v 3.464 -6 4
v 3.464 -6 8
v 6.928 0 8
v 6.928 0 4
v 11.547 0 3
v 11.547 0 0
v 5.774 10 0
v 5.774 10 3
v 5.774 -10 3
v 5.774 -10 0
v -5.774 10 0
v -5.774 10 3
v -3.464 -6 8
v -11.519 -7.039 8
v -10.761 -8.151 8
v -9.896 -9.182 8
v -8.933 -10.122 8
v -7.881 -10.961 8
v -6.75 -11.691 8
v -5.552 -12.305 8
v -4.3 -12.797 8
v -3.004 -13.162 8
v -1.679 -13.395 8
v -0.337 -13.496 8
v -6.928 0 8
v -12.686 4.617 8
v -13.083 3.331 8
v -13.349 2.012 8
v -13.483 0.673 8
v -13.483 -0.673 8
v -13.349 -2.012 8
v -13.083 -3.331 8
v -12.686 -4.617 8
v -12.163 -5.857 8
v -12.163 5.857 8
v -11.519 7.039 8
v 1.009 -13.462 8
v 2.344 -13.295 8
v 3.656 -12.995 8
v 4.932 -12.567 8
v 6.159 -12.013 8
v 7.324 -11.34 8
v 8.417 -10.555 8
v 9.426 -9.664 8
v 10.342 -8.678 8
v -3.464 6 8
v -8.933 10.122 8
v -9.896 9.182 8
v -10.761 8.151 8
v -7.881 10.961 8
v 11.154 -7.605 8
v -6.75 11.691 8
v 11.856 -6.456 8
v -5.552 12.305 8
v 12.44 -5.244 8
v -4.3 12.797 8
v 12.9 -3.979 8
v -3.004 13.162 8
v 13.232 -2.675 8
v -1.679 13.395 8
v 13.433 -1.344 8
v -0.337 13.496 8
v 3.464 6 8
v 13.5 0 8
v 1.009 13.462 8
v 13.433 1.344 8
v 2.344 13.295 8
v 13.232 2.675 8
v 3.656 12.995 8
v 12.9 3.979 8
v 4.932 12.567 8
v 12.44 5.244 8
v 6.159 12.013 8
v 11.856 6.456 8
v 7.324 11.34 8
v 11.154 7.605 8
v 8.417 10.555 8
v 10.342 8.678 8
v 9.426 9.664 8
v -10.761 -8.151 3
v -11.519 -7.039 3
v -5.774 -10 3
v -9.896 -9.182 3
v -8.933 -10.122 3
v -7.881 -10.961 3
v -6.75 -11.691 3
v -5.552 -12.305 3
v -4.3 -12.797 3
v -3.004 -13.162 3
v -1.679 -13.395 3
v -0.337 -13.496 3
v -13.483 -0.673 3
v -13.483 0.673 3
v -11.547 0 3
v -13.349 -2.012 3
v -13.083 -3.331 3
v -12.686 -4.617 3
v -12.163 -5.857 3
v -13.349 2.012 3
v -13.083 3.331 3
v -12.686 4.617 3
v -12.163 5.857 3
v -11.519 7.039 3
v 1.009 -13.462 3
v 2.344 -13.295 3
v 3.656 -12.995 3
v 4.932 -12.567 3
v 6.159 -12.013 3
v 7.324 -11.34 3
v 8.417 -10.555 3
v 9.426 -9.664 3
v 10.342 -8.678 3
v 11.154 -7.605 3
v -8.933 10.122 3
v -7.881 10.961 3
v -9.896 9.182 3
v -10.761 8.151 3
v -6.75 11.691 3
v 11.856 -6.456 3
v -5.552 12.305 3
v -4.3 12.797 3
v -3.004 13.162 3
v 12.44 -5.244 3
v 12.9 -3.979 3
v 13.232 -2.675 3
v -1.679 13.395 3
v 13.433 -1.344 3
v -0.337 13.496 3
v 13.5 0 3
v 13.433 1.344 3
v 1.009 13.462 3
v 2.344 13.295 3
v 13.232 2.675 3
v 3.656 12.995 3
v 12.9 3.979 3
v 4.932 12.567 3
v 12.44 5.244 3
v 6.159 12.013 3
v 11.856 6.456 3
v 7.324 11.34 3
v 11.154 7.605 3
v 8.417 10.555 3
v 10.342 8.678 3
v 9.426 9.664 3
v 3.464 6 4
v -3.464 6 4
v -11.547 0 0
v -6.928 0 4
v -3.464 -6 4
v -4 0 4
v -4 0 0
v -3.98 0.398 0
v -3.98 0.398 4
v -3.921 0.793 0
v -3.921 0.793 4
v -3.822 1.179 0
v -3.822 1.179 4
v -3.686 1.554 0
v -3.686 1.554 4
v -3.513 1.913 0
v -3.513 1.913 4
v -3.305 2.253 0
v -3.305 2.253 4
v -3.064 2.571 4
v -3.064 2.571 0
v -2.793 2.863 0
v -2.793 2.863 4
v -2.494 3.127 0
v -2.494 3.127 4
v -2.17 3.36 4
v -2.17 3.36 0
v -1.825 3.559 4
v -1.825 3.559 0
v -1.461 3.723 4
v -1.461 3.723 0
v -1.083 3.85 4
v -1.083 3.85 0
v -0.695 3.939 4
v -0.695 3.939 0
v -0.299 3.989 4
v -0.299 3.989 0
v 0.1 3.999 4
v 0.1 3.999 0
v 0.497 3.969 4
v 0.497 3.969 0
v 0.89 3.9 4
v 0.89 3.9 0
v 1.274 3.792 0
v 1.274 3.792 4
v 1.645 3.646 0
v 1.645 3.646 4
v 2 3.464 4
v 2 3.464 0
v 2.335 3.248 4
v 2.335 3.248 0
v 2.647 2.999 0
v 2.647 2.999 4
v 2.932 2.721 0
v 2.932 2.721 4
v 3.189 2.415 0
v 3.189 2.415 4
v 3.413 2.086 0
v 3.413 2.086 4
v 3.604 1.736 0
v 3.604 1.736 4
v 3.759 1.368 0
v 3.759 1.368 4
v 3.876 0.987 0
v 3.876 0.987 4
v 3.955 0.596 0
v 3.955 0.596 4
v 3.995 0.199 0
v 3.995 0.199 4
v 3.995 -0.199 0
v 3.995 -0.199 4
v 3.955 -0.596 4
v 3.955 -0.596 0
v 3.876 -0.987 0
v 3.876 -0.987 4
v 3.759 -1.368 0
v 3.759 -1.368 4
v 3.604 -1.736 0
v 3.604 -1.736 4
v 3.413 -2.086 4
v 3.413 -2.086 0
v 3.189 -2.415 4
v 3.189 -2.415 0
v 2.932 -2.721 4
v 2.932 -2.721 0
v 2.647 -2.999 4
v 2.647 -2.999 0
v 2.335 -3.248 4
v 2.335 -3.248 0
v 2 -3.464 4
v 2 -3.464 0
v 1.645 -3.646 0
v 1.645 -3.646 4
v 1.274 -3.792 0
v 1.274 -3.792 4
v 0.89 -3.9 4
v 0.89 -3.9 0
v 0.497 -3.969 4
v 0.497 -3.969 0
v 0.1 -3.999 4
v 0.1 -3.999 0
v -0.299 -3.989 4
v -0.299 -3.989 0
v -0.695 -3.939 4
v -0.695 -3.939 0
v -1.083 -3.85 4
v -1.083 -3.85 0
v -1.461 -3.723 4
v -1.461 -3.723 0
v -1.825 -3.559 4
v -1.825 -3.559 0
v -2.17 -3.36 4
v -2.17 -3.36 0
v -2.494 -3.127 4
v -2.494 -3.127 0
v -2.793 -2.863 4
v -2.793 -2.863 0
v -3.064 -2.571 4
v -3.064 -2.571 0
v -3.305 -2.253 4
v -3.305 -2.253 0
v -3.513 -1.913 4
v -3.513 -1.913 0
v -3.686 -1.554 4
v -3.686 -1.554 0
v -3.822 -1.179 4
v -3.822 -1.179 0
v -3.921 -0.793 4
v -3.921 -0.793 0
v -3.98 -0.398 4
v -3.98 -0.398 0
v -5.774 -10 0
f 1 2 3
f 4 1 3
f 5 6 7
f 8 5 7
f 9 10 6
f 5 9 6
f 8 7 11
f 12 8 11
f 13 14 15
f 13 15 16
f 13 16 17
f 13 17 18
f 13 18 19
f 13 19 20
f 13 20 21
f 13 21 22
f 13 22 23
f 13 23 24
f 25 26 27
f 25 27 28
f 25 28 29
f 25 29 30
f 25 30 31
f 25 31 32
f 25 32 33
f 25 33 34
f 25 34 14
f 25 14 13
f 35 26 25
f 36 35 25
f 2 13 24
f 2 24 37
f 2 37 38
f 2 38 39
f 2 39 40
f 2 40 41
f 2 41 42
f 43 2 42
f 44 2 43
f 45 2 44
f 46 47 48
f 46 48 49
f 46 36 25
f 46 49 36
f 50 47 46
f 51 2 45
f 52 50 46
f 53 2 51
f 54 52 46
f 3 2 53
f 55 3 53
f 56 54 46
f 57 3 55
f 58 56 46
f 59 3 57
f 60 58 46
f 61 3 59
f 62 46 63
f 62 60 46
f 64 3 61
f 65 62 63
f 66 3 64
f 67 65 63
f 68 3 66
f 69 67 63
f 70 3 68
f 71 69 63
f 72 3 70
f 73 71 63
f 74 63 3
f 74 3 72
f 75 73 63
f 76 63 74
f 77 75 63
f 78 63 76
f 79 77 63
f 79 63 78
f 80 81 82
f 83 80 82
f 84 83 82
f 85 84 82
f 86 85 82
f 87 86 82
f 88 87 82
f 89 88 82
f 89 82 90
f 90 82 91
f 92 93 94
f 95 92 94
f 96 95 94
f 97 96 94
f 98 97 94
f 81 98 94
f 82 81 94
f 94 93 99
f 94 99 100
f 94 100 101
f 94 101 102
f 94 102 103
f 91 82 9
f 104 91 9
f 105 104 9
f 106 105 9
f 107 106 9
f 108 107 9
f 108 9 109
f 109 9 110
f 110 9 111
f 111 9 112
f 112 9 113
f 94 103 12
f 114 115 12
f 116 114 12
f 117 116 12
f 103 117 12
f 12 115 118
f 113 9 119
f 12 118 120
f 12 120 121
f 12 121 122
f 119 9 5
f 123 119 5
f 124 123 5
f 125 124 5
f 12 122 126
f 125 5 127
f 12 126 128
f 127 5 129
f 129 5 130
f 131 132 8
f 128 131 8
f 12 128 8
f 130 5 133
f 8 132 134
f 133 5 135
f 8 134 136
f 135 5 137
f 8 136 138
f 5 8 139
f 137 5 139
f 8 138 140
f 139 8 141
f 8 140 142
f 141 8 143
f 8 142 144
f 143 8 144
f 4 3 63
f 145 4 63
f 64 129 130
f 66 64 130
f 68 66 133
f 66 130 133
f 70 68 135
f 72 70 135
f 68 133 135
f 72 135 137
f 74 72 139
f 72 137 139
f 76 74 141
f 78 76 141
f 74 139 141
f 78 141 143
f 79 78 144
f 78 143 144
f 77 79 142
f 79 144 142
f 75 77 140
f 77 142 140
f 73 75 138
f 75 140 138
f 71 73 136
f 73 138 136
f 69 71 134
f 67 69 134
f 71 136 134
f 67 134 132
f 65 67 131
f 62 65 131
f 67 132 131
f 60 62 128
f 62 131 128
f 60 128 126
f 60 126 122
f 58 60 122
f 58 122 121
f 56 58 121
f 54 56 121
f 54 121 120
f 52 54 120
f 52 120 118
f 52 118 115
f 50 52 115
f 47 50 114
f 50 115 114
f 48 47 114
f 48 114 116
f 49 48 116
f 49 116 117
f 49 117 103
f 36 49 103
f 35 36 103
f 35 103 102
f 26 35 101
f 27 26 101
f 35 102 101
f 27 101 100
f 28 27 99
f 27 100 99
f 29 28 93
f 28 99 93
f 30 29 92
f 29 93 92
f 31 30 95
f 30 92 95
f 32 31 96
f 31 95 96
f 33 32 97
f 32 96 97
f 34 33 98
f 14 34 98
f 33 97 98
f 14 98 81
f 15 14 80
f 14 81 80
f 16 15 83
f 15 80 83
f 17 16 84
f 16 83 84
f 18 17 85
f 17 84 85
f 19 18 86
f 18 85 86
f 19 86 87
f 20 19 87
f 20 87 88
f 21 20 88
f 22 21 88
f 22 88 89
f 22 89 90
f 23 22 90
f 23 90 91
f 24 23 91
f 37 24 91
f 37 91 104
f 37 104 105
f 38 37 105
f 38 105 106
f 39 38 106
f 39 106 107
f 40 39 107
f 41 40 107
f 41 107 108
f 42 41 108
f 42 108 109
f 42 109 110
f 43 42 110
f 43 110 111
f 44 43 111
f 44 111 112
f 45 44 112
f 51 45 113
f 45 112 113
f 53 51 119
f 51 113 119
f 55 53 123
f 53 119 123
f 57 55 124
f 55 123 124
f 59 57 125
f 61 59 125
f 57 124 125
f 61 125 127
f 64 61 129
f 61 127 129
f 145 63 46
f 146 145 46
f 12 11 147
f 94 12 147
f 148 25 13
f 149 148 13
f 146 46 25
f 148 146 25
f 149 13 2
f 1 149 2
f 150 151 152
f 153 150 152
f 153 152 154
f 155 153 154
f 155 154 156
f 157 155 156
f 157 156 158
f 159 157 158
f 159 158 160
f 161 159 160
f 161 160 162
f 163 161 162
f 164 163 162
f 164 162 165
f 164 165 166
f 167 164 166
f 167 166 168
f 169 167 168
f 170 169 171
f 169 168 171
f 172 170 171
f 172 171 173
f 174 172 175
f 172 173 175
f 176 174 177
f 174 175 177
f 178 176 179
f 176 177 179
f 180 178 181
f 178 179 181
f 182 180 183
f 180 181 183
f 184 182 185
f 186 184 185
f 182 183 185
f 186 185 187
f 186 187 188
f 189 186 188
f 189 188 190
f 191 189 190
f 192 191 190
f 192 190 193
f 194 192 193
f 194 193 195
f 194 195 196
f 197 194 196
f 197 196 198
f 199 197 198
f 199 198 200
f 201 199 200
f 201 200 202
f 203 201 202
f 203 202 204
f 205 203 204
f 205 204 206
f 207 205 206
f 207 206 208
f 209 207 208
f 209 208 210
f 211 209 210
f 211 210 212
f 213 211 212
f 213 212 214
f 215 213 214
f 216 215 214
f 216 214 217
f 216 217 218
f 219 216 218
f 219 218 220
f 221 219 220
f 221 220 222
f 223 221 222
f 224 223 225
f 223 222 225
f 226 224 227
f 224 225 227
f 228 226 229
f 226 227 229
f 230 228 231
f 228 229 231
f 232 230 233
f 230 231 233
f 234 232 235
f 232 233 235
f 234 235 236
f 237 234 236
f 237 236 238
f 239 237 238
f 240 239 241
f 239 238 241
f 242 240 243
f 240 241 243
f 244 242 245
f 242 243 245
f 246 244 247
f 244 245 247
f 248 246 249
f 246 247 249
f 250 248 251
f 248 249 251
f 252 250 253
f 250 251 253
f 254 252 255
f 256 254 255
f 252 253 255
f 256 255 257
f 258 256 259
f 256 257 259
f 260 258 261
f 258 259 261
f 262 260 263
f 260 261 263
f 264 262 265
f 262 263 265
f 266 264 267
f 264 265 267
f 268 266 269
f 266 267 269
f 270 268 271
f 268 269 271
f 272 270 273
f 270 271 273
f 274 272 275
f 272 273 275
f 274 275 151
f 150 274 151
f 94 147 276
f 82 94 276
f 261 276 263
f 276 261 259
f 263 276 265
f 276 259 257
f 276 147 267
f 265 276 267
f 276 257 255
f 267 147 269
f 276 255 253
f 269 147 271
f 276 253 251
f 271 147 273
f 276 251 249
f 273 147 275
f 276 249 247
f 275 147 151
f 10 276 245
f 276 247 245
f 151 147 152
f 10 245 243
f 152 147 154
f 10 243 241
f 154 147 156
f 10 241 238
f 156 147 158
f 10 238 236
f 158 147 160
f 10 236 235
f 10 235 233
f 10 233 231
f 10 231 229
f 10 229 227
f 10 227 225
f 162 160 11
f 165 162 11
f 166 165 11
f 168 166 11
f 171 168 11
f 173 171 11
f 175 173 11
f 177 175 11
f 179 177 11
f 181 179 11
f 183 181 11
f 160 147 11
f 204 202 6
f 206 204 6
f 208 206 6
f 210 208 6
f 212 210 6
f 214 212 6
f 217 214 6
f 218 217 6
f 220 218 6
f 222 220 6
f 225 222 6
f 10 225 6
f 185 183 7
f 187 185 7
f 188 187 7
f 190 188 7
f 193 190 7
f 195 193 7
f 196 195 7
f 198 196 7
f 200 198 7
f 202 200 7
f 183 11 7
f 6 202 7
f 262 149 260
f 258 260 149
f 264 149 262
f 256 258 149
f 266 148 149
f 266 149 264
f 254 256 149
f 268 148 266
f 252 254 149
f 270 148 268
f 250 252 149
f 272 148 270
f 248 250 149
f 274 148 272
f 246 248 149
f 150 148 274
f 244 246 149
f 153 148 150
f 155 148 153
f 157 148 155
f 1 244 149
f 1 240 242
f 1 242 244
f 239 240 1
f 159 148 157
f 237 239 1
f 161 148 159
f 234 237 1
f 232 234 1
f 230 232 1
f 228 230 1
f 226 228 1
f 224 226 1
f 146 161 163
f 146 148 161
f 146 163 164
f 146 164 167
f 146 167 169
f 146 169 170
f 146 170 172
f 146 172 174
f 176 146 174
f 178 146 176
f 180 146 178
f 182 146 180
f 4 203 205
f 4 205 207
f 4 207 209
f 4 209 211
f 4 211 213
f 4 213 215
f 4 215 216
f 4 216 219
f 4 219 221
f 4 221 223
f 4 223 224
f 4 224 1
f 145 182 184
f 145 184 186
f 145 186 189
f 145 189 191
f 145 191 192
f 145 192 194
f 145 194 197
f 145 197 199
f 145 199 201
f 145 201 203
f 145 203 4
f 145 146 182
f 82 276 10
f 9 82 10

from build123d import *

# Parameters (mm, degrees)
BOSS_EXTRUDE1_DEPTH = 3
SKETCH3_R           = 13.5
BOSS_EXTRUDE2_DEPTH = 5
CUT_EXTRUDE1_DEPTH  = 4
SKETCH6_R           = 4
CUT_EXTRUDE2_DEPTH  = 9


with BuildPart() as part:
    # Sketch1 → Boss-Extrude1 (new body)
    with BuildSketch(Plane.XY):
        Polygon((11.547005384, 0), (5.773502692, 10), (-5.773502692, 10), (-11.547005384, 0), (-5.773502692, -10), (5.773502692, -10), align=None)
    extrude(amount=BOSS_EXTRUDE1_DEPTH)

    # Sketch3 → Boss-Extrude2 (add)
    with BuildSketch(Plane.XY.offset(3)):
        Circle(SKETCH3_R)
    extrude(amount=BOSS_EXTRUDE2_DEPTH)

    # Sketch4 → Cut-Extrude1 (cut)
    with BuildSketch(Plane.XY.offset(8)):
        Polygon((3.464101615, -6), (6.92820323, 0), (3.464101615, 6), (-3.464101615, 6), (-6.92820323, 0), (-3.464101615, -6), align=None)
    extrude(amount=-CUT_EXTRUDE1_DEPTH, mode=Mode.SUBTRACT)

    # Sketch6 → Cut-Extrude2 (cut, through all)
    with BuildSketch(Plane(origin=(0, 0, 0), x_dir=(-1, 0, 0), z_dir=(0, 0, -1))):
        Circle(SKETCH6_R)
    extrude(amount=-CUT_EXTRUDE2_DEPTH, mode=Mode.SUBTRACT)


solid = part.part
